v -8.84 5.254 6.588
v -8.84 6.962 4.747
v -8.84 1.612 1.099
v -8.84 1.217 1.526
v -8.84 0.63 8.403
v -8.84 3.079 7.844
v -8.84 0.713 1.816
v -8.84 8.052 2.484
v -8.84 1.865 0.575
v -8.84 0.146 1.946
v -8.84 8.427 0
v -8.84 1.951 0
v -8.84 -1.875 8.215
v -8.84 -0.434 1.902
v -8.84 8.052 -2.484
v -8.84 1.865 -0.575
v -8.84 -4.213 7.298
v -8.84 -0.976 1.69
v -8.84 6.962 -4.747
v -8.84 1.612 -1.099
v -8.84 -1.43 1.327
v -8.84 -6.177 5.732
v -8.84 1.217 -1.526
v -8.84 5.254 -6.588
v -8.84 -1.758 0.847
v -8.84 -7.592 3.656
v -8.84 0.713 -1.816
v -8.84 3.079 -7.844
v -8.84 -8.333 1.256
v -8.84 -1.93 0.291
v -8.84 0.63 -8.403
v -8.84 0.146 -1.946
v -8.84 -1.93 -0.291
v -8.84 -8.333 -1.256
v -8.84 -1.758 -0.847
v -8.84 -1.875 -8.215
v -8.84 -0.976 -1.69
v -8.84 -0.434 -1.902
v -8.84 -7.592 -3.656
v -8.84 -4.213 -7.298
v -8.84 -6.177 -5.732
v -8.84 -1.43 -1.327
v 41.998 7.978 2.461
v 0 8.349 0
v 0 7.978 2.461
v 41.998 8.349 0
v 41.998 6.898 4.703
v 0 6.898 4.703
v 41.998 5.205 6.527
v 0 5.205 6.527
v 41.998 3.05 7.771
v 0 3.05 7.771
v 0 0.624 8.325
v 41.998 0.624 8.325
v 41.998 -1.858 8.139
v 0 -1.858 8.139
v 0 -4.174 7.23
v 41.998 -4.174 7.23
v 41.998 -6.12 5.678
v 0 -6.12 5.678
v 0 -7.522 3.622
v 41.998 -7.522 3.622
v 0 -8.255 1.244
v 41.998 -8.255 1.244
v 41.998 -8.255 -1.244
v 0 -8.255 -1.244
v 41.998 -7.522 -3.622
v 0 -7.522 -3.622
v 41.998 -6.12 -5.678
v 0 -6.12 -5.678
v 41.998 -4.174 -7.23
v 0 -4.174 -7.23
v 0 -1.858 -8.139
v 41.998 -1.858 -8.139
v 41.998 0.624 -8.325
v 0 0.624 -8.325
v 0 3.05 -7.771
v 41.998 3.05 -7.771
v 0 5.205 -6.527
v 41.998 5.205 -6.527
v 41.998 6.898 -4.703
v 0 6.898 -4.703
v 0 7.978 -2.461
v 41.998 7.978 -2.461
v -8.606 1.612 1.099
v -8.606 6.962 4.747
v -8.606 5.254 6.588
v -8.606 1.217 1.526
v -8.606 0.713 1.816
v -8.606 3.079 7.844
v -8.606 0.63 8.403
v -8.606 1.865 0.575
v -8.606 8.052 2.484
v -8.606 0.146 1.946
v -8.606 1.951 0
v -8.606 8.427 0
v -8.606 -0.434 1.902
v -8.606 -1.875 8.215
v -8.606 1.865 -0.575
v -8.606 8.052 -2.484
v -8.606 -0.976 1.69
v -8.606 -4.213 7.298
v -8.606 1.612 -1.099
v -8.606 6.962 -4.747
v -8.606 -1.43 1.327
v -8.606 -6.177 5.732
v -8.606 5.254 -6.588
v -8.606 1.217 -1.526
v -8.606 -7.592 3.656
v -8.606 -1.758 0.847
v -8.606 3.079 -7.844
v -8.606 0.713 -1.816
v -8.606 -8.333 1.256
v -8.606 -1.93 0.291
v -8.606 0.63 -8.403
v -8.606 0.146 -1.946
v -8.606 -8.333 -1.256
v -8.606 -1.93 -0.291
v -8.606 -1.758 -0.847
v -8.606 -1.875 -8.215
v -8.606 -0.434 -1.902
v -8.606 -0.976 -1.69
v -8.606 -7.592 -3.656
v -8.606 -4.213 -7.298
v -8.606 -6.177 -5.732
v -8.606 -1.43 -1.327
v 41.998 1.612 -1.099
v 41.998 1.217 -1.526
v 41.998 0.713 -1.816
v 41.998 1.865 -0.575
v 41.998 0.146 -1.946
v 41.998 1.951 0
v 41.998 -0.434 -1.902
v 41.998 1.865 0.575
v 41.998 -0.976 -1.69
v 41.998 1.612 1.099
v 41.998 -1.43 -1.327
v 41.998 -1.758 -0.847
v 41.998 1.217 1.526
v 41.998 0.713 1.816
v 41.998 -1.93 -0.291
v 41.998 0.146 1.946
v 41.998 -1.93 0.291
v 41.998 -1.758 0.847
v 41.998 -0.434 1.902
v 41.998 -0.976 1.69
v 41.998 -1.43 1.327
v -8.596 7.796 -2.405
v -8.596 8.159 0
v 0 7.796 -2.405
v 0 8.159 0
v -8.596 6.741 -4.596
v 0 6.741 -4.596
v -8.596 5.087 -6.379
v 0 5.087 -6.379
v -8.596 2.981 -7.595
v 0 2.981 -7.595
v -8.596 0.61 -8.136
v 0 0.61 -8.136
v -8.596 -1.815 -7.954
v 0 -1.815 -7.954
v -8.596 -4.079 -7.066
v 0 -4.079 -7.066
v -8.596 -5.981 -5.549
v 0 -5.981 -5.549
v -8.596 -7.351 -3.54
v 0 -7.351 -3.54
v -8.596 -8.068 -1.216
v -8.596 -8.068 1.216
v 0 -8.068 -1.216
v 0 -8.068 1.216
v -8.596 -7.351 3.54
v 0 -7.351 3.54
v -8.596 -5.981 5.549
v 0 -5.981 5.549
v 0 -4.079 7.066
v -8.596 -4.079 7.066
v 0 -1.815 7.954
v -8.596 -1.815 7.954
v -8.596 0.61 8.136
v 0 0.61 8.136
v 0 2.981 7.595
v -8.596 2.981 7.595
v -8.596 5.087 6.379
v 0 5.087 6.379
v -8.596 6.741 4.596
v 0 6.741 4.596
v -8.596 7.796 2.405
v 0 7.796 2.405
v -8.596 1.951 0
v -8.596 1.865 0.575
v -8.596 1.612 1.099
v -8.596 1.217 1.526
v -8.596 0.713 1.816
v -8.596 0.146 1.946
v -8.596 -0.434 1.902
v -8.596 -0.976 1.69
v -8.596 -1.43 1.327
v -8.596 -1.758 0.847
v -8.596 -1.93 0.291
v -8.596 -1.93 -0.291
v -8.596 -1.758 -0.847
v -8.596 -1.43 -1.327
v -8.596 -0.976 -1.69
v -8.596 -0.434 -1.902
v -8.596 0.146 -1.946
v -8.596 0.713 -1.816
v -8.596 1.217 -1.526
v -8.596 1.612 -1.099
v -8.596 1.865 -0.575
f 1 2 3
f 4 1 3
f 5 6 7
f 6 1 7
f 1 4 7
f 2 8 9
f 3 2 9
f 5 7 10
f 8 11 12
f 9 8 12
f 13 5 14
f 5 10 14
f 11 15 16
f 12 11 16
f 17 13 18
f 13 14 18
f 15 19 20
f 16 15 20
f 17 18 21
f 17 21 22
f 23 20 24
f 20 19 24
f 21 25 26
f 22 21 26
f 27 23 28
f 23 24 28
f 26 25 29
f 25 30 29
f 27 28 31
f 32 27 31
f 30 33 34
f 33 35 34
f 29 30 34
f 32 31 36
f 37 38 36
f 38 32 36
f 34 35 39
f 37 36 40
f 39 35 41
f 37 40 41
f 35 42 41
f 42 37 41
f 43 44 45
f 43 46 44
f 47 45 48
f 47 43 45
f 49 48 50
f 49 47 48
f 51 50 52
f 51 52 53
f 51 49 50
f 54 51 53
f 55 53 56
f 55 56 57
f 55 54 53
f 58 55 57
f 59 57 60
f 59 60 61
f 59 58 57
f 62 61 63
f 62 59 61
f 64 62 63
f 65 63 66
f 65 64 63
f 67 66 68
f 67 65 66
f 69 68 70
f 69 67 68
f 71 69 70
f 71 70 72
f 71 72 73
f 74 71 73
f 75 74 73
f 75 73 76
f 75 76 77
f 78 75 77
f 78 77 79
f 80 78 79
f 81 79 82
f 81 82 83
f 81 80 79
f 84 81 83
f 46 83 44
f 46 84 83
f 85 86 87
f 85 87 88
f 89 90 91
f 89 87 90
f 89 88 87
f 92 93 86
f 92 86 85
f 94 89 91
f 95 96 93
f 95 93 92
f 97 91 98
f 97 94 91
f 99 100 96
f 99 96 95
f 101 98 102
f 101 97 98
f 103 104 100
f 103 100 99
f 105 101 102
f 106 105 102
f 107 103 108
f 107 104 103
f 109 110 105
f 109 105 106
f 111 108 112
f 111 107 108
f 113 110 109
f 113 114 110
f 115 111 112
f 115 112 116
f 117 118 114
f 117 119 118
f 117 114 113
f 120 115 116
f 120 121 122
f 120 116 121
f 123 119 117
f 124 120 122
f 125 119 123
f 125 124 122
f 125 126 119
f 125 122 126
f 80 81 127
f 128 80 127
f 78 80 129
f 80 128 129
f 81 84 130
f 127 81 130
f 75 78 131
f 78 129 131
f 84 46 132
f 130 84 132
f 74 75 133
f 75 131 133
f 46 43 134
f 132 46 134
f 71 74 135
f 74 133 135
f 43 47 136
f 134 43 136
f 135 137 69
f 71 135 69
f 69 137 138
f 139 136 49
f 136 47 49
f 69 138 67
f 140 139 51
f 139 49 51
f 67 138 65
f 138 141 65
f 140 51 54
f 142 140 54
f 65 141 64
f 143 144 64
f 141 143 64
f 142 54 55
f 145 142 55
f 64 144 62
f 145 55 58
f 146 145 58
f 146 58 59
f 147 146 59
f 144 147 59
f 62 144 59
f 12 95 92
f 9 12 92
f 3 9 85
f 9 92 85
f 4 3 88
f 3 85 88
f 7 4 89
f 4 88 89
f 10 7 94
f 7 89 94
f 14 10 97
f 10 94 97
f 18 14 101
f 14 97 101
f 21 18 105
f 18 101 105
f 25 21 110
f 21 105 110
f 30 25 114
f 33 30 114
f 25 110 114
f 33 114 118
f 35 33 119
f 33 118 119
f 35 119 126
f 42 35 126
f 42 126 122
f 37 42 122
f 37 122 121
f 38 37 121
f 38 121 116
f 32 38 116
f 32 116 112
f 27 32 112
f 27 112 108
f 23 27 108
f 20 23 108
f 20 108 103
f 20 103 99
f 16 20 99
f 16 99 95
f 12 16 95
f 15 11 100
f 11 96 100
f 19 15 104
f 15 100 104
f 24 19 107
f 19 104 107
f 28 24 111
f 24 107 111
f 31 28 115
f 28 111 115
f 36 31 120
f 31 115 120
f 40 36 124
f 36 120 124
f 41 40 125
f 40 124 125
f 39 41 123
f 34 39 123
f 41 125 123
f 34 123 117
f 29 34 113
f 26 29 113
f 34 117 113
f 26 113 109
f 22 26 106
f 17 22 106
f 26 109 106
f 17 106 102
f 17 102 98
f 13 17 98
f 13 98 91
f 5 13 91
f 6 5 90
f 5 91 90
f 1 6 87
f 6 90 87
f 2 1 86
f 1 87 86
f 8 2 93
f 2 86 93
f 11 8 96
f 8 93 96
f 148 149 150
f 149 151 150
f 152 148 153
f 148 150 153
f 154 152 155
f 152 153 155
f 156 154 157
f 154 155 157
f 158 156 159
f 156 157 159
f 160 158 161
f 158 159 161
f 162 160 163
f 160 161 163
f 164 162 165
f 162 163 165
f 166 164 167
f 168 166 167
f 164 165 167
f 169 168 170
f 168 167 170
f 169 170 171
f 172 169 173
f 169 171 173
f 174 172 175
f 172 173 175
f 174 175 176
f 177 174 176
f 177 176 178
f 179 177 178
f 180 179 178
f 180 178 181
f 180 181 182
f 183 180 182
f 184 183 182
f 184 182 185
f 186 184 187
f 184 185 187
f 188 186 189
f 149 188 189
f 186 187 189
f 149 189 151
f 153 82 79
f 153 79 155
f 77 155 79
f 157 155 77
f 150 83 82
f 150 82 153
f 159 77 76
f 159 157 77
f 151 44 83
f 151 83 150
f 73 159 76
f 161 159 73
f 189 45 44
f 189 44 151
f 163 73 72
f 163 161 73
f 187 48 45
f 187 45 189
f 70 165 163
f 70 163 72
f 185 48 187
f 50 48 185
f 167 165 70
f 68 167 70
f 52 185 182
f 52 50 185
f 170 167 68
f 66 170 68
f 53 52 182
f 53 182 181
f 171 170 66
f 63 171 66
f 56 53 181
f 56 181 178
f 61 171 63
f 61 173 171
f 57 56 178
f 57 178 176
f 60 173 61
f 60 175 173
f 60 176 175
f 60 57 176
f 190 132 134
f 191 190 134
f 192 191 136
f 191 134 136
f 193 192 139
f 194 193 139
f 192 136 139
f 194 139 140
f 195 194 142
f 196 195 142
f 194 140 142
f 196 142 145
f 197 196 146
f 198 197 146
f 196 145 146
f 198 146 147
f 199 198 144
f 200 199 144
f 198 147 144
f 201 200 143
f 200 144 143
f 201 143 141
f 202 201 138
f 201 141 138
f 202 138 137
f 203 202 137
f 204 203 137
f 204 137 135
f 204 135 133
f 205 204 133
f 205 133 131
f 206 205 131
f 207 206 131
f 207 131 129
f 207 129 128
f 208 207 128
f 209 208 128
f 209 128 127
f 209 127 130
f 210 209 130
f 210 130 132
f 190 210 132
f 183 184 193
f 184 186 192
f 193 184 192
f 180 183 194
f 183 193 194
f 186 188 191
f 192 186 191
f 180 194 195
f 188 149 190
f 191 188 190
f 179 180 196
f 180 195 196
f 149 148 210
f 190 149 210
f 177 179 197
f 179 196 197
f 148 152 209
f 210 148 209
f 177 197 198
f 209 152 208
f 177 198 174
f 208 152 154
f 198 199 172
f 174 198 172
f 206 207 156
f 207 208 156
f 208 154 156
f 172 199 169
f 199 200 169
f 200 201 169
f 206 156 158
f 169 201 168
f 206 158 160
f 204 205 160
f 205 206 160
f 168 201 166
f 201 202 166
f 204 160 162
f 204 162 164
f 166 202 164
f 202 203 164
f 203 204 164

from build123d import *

# Parameters (mm, degrees)
F0_W     = 41.9983193278
F0_H     = 8.3485795185
F2_W     = 8.5956929252
F2_H     = 8.1586567685
F4_W     = 0.2334481105
F4_H     = 8.4266876802
F6_R     = 1.9513814008
F7_DEPTH = 54.71847


with BuildPart() as f1:
    # F0 (on Top) → F1 (revolve)
    with BuildSketch(Plane.XY):
        with Locations((20.9991596639, 4.1742897592)):
            Rectangle(F0_W, F0_H)
    revolve(axis=Axis((20.9991596639, 0, 0), (1, 0, 0)))

    # F2 (on Top) → F3 (revolve)
    with BuildSketch(Plane.XY):
        with Locations((-4.2978464626, 4.0793283843)):
            Rectangle(F2_W, F2_H)
    revolve(axis=Axis((-4.2978464626, 0, 0), (-1, 0, 0)))


with BuildPart() as f5:
    # F4 (on Top) → F5 (revolve)
    with BuildSketch(Plane.XY):
        with Locations((-8.7230424397, 4.2133438401)):
            Rectangle(F4_W, F4_H)
    revolve(axis=Axis((-8.7230424397, 0, 0), (-1, 0, 0)))


with BuildPart() as f7_tool:
    # F6 (on face) → F7 (new body)
    with BuildSketch(Plane.YZ.offset(41.9983193278)):
        Circle(F6_R)
    extrude(amount=-F7_DEPTH)


with BuildPart() as f1_1:
    add(f1.part)

    # F7: cut by f7_tool
    add(f7_tool.part, mode=Mode.SUBTRACT)


with BuildPart() as f5_1:
    add(f5.part)

    # F7: cut by f7_tool
    add(f7_tool.part, mode=Mode.SUBTRACT)


solid = Compound([f1_1.part, f5_1.part])
